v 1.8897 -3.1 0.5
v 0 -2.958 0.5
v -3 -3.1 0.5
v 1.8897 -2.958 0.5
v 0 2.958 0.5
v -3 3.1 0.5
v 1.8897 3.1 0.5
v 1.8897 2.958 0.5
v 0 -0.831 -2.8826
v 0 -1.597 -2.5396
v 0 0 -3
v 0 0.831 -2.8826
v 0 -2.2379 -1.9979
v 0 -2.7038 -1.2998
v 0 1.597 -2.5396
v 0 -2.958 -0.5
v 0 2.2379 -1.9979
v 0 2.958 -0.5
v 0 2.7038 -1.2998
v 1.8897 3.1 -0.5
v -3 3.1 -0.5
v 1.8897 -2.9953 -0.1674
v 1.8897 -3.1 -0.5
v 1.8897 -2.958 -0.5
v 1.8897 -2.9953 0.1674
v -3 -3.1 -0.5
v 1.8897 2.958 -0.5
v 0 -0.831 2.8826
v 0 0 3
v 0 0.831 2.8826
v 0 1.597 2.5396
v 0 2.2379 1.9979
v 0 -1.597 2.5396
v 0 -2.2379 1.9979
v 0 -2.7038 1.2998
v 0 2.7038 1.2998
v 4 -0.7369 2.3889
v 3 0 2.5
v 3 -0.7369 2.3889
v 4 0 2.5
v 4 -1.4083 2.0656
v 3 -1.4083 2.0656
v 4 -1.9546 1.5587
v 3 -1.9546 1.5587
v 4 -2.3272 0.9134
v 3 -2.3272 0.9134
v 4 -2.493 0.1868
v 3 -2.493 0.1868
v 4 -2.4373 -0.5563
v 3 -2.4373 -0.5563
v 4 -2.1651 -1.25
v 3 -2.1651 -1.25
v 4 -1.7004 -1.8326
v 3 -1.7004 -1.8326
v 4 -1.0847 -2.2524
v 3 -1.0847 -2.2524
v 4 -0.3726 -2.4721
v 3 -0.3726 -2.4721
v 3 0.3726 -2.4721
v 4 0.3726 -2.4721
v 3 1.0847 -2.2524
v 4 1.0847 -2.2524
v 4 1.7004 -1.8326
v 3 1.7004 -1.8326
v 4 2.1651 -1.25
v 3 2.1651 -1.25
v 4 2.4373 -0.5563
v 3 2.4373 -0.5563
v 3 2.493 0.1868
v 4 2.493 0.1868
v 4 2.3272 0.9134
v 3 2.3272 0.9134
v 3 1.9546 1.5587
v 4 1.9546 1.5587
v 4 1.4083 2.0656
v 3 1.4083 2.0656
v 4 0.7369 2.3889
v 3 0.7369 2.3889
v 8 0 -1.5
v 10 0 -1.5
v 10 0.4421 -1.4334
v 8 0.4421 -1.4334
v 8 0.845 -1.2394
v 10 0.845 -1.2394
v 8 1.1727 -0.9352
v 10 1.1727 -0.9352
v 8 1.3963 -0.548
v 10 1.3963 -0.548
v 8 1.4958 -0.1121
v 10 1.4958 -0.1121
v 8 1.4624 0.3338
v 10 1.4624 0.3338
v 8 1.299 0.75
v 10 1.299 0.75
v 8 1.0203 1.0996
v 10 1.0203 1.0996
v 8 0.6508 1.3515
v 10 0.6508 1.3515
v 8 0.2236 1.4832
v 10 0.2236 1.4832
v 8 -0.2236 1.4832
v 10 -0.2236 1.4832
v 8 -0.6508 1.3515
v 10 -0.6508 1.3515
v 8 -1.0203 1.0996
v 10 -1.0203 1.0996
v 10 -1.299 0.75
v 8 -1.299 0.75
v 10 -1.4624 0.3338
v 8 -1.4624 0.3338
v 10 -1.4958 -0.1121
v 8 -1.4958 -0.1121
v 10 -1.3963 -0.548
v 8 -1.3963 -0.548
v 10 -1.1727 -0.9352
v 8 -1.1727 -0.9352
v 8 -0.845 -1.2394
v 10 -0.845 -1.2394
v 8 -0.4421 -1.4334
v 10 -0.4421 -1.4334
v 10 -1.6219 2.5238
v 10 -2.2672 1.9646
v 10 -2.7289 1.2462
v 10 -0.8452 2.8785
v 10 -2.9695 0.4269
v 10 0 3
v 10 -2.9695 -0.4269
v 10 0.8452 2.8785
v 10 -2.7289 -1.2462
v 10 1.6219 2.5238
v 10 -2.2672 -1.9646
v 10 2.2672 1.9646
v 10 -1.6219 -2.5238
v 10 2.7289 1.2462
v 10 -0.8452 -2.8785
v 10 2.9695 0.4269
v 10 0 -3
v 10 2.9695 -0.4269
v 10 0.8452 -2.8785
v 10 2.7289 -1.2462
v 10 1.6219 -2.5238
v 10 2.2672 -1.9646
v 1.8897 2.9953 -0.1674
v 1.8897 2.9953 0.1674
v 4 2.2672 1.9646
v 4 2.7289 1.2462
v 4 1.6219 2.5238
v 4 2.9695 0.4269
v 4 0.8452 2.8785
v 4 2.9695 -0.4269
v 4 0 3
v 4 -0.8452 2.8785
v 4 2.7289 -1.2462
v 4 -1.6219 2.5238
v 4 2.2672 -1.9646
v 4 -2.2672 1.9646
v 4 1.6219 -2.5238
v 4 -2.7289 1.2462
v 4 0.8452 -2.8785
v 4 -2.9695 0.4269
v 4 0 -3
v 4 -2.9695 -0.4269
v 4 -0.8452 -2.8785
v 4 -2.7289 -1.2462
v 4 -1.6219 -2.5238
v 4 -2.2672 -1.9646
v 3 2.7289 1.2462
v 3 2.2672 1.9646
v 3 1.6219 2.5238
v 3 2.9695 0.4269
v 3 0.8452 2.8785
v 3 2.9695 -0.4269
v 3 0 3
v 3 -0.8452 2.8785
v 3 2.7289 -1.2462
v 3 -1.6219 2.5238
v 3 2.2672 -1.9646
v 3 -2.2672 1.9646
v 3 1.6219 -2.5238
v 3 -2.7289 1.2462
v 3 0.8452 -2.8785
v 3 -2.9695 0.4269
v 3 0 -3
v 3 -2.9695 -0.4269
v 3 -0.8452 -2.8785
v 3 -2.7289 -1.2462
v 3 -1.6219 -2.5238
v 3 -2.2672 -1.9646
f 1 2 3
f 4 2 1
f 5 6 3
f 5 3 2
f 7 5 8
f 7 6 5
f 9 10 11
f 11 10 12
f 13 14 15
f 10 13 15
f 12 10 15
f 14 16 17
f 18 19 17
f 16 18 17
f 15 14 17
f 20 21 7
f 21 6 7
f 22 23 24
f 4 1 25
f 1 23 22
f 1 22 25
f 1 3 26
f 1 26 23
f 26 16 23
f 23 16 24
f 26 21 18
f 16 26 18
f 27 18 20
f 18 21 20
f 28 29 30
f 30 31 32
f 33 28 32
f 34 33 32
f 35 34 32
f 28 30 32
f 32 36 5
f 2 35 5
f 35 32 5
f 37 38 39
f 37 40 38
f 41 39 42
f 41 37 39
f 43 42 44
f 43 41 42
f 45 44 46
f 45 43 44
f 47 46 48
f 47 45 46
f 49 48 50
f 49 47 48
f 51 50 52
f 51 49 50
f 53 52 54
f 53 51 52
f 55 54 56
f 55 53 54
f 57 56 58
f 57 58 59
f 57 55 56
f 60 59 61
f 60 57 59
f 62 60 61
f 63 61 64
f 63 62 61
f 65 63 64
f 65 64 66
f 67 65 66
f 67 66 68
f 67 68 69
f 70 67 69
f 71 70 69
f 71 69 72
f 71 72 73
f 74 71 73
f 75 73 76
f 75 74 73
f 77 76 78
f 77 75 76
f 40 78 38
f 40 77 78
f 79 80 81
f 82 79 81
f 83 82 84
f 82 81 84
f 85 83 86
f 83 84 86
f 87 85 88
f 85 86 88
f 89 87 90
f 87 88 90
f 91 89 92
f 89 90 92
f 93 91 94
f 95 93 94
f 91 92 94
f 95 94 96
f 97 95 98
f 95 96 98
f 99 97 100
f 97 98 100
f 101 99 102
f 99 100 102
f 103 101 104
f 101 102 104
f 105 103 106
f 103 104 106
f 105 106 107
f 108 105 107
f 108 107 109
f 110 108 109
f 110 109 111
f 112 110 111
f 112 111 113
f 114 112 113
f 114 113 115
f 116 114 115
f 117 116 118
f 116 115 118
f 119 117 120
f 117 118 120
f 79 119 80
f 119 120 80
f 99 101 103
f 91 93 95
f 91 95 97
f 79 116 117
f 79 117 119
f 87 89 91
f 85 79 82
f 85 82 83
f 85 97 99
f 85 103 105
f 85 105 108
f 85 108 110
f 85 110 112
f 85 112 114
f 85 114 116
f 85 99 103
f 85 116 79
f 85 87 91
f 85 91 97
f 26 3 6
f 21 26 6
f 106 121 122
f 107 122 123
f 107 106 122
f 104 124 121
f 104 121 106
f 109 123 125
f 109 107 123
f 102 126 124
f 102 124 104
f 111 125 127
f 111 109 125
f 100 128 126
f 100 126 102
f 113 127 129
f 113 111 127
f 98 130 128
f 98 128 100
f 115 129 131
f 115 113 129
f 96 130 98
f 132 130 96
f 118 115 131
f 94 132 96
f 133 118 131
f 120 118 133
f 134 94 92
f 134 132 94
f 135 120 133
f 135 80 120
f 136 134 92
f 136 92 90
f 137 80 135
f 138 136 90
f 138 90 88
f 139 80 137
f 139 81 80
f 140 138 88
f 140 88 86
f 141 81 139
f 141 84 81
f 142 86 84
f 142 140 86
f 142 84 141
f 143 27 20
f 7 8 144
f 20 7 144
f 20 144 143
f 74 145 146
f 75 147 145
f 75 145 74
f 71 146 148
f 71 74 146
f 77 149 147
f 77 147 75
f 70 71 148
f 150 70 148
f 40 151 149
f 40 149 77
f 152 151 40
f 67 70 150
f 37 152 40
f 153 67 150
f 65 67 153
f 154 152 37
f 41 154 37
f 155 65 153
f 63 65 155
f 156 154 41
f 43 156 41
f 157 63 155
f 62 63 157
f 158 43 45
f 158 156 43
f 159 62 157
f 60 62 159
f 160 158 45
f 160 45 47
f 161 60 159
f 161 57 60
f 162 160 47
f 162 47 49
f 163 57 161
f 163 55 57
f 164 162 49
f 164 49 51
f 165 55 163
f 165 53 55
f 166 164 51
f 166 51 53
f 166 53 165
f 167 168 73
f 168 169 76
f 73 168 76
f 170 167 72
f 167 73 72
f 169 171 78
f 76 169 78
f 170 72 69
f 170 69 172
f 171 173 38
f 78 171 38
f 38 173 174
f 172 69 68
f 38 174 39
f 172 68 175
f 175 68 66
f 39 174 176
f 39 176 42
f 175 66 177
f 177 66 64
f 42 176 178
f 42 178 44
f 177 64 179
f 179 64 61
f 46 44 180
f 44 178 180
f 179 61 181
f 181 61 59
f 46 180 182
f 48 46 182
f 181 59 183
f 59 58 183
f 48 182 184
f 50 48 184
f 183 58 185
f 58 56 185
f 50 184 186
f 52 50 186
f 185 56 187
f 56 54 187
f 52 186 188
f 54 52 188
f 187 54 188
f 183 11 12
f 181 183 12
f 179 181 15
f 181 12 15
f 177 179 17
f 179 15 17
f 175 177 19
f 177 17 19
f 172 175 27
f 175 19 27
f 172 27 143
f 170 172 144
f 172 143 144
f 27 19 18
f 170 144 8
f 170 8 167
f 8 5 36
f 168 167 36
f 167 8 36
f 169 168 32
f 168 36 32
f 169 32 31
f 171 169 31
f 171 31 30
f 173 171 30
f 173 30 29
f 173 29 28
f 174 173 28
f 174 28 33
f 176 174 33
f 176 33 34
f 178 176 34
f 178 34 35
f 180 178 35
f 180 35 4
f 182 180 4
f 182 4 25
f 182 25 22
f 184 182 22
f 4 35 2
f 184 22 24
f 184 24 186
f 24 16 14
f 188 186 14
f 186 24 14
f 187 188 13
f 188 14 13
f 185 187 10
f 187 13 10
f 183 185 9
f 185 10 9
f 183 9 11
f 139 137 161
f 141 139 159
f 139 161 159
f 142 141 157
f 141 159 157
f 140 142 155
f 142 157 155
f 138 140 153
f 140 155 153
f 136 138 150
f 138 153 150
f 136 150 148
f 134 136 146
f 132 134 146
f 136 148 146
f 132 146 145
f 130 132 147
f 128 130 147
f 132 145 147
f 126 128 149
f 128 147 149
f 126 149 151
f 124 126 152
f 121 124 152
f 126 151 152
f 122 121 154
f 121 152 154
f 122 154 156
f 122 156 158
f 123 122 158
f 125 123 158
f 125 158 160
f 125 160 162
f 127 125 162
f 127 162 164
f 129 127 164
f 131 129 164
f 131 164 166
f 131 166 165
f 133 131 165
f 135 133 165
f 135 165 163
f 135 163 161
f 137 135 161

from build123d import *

# Parameters (mm, degrees)
SKETCH_1_R          = 3
EXTRUDE_1_DEPTH     = 10
SKETCH_2_W          = 1
SKETCH_2_H          = 0.5
SKETCH_3_R          = 1.5
CUT_EXTRUDE_1_DEPTH = 2
SKETCH_4_W          = 4.889658543
SKETCH_4_H          = 6.2
EXTRUDE_2_DEPTH     = 0.5


with BuildPart() as part:
    # Эскиз1 → Бобышка-Вытянуть1 (new body)
    with BuildSketch(Plane(origin=(0, 0, 0), x_dir=(0, 0, -1), z_dir=(1, 0, 0))):
        Circle(SKETCH_1_R)
    extrude(amount=EXTRUDE_1_DEPTH)

    # Эскиз2 → Вырез-Повернуть1 (revolve, cut)
    with BuildSketch(Plane.XY, mode=Mode.PRIVATE) as cut_revolve_1_sk:
        with Locations((3.5, 2.75)):
            Rectangle(SKETCH_2_W, SKETCH_2_H)
    revolve(cut_revolve_1_sk.sketch.rotate(Axis((-1000, 0, 0), (1, 0, 0)), 90), axis=Axis((-1000, 0, 0), (1, 0, 0)), mode=Mode.SUBTRACT)

    # Эскиз3 → Вырез-Вытянуть1 (cut)
    with BuildSketch(Plane(origin=(10, 0, 0), x_dir=(0, 0, -1), z_dir=(1, 0, 0))):
        Circle(SKETCH_3_R)
    extrude(amount=-CUT_EXTRUDE_1_DEPTH, mode=Mode.SUBTRACT)

    # Эскиз4 → Бобышка-Вытянуть2 (add, symmetric)
    with BuildSketch(Plane.XY):
        with Locations((-0.555170728, 0)):
            Rectangle(SKETCH_4_W, SKETCH_4_H)
    extrude(amount=EXTRUDE_2_DEPTH, both=True)


solid = part.part
